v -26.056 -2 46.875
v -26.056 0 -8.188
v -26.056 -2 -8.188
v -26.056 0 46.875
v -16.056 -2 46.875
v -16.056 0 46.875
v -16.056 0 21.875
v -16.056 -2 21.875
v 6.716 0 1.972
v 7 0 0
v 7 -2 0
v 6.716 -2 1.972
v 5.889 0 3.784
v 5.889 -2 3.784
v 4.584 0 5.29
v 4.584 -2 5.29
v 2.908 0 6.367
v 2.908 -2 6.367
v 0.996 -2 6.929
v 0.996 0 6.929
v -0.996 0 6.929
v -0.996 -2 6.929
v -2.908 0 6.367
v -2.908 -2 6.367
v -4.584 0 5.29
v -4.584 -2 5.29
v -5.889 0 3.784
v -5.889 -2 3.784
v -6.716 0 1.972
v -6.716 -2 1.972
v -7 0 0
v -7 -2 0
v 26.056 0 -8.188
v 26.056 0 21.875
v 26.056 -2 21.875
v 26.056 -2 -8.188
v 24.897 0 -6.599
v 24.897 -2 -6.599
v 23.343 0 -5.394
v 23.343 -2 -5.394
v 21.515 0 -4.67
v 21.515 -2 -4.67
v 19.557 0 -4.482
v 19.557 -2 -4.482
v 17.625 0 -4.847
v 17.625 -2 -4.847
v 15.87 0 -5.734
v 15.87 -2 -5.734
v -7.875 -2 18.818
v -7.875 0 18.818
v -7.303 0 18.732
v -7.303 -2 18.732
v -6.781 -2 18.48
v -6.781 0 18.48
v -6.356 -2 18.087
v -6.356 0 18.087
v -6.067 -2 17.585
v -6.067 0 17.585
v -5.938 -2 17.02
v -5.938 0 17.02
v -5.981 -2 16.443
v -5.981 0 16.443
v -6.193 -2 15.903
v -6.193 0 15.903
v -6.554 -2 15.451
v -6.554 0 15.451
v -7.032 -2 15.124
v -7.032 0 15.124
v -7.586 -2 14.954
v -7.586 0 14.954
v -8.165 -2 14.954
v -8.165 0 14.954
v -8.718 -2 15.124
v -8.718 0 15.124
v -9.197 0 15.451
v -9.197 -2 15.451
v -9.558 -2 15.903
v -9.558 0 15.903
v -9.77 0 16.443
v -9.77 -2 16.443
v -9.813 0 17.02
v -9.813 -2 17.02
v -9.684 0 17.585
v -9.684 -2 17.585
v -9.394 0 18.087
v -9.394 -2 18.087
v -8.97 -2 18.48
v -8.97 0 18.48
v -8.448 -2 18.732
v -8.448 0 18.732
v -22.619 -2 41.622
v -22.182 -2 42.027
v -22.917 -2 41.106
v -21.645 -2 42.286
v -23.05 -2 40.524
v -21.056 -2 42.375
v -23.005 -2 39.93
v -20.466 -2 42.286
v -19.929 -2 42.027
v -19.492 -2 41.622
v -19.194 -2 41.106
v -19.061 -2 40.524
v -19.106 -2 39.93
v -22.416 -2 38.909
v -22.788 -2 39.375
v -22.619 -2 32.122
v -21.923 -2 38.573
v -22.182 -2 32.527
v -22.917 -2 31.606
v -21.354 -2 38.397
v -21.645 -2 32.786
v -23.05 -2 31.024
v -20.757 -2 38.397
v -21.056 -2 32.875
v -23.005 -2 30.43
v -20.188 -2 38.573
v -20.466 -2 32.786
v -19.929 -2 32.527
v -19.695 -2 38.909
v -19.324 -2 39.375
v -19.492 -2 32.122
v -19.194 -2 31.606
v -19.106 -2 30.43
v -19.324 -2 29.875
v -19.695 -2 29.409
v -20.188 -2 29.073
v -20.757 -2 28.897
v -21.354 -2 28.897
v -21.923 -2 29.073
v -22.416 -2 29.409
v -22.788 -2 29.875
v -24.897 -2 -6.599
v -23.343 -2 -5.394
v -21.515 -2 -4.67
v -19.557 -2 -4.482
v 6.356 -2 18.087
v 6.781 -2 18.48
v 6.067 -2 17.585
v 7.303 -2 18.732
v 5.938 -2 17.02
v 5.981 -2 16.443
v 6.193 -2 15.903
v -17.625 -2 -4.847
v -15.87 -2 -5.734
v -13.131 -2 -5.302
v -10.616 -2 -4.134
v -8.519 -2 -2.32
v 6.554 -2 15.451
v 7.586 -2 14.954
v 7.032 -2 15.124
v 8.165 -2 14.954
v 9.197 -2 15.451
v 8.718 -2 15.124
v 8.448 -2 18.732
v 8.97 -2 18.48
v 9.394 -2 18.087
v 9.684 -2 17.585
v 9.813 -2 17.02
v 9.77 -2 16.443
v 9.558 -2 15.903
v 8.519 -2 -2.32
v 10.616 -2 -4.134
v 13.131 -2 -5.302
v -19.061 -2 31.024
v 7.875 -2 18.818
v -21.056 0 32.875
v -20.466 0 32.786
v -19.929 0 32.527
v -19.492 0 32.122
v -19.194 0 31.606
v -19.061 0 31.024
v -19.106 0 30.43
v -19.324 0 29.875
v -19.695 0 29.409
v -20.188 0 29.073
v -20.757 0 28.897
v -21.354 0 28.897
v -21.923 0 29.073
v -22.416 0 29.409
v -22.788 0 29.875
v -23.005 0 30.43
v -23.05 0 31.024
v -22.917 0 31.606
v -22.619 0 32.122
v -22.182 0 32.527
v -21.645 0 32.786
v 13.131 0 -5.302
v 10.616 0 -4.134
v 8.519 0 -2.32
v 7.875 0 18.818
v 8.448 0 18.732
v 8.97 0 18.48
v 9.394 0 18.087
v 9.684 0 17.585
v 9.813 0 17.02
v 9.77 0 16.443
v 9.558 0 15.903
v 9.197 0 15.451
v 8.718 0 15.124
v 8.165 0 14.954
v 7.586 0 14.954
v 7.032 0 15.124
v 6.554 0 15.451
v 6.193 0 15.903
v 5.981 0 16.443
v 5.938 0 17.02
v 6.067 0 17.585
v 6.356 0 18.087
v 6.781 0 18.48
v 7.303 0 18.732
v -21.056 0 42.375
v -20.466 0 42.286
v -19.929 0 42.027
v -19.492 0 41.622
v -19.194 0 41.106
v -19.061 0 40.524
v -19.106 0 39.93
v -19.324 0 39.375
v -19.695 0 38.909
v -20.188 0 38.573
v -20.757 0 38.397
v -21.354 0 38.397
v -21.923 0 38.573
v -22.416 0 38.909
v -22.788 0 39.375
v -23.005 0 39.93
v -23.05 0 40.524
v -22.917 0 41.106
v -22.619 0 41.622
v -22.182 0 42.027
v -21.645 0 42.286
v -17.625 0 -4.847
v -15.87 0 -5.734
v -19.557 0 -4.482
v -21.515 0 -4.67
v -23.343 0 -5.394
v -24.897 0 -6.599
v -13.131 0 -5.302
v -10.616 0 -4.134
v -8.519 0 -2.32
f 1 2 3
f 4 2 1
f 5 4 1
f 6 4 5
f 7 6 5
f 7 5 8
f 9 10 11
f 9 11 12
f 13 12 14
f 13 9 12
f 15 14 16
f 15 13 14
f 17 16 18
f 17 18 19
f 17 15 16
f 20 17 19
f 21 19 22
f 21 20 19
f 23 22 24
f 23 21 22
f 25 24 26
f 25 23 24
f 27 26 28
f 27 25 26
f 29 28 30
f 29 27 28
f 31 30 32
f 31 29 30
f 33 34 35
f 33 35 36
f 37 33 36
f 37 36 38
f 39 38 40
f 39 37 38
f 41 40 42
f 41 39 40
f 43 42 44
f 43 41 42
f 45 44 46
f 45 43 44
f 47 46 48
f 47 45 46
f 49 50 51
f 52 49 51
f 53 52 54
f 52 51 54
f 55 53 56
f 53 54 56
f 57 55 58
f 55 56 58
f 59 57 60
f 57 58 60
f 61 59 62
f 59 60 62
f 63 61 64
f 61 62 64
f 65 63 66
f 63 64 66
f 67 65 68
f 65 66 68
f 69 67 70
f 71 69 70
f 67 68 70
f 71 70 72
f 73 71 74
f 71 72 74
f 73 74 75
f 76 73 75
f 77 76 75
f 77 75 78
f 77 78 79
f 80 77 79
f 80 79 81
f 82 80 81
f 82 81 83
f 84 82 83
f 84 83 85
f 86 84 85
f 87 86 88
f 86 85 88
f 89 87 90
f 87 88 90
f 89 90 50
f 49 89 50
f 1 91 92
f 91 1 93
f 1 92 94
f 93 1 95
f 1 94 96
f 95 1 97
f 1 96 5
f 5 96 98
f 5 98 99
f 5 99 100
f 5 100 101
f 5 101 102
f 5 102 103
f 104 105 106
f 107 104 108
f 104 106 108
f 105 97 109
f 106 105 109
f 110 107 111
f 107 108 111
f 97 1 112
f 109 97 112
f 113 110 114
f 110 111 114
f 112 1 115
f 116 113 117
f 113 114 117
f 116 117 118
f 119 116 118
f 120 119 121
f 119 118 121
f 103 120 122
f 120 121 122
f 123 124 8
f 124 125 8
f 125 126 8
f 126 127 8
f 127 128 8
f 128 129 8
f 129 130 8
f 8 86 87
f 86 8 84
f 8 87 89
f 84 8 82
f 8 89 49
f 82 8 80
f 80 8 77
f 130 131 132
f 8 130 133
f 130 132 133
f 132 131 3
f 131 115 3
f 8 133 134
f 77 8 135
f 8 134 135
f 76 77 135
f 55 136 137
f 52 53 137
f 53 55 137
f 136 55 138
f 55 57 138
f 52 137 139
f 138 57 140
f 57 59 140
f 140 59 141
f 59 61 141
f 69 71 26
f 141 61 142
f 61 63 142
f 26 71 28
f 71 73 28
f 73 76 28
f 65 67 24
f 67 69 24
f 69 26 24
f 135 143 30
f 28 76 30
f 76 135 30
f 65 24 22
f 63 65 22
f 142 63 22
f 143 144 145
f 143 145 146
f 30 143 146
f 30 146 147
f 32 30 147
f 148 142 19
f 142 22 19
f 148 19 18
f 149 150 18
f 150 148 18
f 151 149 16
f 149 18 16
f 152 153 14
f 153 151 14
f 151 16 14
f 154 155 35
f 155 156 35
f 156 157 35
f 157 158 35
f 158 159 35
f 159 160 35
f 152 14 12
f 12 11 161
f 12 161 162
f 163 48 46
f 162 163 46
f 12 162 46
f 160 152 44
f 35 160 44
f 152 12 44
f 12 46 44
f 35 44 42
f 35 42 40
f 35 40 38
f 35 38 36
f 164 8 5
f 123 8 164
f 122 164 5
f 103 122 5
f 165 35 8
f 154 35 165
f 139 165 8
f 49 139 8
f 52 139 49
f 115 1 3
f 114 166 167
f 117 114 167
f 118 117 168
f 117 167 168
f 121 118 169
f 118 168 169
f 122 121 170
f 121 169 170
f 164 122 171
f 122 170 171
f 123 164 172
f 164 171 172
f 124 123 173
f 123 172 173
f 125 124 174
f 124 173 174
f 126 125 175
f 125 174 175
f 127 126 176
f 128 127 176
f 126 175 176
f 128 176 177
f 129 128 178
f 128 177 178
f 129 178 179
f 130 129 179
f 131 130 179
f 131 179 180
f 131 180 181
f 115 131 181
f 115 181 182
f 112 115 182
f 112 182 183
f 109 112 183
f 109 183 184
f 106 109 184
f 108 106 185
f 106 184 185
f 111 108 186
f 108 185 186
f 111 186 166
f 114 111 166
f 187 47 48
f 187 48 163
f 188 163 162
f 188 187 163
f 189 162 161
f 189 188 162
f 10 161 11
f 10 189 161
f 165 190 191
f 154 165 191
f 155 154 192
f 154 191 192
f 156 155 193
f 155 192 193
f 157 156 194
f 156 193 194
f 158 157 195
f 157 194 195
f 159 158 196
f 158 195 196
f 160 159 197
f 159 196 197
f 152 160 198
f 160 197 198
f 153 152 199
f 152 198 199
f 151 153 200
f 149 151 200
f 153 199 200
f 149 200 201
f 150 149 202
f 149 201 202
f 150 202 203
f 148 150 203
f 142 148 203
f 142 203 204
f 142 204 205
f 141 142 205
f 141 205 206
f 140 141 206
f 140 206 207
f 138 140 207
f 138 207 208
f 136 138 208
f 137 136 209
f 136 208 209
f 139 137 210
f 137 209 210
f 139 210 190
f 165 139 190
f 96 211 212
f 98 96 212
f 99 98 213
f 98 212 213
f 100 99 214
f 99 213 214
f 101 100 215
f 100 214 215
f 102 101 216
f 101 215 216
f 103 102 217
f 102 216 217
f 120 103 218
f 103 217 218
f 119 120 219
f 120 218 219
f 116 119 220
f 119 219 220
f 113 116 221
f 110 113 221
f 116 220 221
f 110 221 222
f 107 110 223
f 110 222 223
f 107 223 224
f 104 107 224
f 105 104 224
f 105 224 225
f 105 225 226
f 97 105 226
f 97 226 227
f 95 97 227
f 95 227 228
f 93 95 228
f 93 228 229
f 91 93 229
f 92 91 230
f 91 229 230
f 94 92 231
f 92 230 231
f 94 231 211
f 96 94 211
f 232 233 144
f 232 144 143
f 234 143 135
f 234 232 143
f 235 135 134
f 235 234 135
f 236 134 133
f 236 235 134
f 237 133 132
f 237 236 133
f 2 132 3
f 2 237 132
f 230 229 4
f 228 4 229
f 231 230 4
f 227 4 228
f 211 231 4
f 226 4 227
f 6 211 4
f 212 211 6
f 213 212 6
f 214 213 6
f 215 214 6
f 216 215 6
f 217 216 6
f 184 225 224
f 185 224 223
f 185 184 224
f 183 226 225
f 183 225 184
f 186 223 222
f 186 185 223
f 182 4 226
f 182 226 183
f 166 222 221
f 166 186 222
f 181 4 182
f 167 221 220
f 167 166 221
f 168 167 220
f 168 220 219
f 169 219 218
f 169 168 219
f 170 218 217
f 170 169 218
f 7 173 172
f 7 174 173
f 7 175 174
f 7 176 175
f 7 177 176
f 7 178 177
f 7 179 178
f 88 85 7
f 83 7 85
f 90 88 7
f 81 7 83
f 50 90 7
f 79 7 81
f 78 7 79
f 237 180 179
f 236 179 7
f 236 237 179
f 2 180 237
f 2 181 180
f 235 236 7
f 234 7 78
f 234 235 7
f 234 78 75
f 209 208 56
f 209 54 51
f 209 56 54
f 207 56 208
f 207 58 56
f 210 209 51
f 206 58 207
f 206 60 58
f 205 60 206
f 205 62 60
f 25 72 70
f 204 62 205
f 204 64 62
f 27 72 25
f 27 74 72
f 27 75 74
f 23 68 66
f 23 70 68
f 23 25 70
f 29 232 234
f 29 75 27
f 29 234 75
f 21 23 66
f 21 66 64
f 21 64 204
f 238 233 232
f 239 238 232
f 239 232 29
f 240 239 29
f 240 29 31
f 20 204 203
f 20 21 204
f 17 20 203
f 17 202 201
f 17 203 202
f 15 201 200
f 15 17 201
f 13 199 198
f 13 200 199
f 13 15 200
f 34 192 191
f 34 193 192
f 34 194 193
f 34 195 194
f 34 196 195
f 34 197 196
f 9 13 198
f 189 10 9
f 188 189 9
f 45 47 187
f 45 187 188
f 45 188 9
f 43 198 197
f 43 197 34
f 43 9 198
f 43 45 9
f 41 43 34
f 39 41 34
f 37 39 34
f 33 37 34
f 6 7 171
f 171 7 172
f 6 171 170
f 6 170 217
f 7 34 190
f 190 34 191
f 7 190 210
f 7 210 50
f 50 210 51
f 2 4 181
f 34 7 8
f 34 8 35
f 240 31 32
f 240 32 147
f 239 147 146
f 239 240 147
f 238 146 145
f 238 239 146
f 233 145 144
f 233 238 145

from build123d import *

# Parameters (mm, degrees)
BASE_FLANGE1_DEPTH = 2
SKETCH7_R          = 2
CUT_EXTRUDE1_DEPTH = 2
SKETCH9_R          = 1.9431
CUT_EXTRUDE2_DEPTH = 2


# Sheet-metal steps are written as plain solids
with BuildPart() as part:
    # Sketch2 → Base-Flange1 (new body)
    with BuildSketch(Plane(origin=(0, 0, 0), x_dir=(1, 0, 0), z_dir=(0, 1, 0))):
        with BuildLine():
            Line((-26.055569119, -21.875), (-26.055569119, -46.875))
            Line((-26.055569119, -46.875), (-16.055569119, -46.875))
            Line((-16.055569119, -46.875), (-16.055569119, -21.875))
            Line((-16.055569119, -21.875), (26.055569119, -21.875))
            Line((26.055569119, -21.875), (26.055569119, 8.188046441))
            ThreePointArc((26.055569119, 8.188046441), (21.514872246, 4.669726518), (15.870079226, 5.73406431))
            ThreePointArc((15.870079226, 5.73406431), (10.616247764, 4.133629141), (7, 0))
            ThreePointArc((7, 0), (0, -7), (-7, 0))
            ThreePointArc((-7, 0), (-10.616247764, 4.133629141), (-15.870079226, 5.73406431))
            ThreePointArc((-15.870079226, 5.73406431), (-21.514872246, 4.669726518), (-26.055569119, 8.188046441))
            Line((-26.055569119, 8.188046441), (-26.055569119, -21.875))
        make_face()
    extrude(amount=-BASE_FLANGE1_DEPTH)

    # Sketch7 → Cut-Extrude1 (cut)
    with BuildSketch(Plane(origin=(0, 0, 0), x_dir=(1, 0, 0), z_dir=(0, 1, 0))):
        with Locations(Location((-21.055569119, -40.375, 0), (0, 0, 270))):
            Circle(SKETCH7_R)
        with Locations(Location((-21.055569119, -30.875, 0), (0, 0, 270))):
            Circle(SKETCH7_R)
    extrude(amount=-CUT_EXTRUDE1_DEPTH, mode=Mode.SUBTRACT)

    # Sketch9 → Cut-Extrude2 (cut)
    with BuildSketch(Plane(origin=(0, 0, 0), x_dir=(1, 0, 0), z_dir=(0, 1, 0))):
        with Locations(Location((-7.875283017, -16.875, 0), (0, 0, 270))):
            Circle(SKETCH9_R)
        with Locations(Location((7.875283017, -16.875, 0), (0, 0, 270))):
            Circle(SKETCH9_R)
    extrude(amount=-CUT_EXTRUDE2_DEPTH, mode=Mode.SUBTRACT)


solid = part.part
